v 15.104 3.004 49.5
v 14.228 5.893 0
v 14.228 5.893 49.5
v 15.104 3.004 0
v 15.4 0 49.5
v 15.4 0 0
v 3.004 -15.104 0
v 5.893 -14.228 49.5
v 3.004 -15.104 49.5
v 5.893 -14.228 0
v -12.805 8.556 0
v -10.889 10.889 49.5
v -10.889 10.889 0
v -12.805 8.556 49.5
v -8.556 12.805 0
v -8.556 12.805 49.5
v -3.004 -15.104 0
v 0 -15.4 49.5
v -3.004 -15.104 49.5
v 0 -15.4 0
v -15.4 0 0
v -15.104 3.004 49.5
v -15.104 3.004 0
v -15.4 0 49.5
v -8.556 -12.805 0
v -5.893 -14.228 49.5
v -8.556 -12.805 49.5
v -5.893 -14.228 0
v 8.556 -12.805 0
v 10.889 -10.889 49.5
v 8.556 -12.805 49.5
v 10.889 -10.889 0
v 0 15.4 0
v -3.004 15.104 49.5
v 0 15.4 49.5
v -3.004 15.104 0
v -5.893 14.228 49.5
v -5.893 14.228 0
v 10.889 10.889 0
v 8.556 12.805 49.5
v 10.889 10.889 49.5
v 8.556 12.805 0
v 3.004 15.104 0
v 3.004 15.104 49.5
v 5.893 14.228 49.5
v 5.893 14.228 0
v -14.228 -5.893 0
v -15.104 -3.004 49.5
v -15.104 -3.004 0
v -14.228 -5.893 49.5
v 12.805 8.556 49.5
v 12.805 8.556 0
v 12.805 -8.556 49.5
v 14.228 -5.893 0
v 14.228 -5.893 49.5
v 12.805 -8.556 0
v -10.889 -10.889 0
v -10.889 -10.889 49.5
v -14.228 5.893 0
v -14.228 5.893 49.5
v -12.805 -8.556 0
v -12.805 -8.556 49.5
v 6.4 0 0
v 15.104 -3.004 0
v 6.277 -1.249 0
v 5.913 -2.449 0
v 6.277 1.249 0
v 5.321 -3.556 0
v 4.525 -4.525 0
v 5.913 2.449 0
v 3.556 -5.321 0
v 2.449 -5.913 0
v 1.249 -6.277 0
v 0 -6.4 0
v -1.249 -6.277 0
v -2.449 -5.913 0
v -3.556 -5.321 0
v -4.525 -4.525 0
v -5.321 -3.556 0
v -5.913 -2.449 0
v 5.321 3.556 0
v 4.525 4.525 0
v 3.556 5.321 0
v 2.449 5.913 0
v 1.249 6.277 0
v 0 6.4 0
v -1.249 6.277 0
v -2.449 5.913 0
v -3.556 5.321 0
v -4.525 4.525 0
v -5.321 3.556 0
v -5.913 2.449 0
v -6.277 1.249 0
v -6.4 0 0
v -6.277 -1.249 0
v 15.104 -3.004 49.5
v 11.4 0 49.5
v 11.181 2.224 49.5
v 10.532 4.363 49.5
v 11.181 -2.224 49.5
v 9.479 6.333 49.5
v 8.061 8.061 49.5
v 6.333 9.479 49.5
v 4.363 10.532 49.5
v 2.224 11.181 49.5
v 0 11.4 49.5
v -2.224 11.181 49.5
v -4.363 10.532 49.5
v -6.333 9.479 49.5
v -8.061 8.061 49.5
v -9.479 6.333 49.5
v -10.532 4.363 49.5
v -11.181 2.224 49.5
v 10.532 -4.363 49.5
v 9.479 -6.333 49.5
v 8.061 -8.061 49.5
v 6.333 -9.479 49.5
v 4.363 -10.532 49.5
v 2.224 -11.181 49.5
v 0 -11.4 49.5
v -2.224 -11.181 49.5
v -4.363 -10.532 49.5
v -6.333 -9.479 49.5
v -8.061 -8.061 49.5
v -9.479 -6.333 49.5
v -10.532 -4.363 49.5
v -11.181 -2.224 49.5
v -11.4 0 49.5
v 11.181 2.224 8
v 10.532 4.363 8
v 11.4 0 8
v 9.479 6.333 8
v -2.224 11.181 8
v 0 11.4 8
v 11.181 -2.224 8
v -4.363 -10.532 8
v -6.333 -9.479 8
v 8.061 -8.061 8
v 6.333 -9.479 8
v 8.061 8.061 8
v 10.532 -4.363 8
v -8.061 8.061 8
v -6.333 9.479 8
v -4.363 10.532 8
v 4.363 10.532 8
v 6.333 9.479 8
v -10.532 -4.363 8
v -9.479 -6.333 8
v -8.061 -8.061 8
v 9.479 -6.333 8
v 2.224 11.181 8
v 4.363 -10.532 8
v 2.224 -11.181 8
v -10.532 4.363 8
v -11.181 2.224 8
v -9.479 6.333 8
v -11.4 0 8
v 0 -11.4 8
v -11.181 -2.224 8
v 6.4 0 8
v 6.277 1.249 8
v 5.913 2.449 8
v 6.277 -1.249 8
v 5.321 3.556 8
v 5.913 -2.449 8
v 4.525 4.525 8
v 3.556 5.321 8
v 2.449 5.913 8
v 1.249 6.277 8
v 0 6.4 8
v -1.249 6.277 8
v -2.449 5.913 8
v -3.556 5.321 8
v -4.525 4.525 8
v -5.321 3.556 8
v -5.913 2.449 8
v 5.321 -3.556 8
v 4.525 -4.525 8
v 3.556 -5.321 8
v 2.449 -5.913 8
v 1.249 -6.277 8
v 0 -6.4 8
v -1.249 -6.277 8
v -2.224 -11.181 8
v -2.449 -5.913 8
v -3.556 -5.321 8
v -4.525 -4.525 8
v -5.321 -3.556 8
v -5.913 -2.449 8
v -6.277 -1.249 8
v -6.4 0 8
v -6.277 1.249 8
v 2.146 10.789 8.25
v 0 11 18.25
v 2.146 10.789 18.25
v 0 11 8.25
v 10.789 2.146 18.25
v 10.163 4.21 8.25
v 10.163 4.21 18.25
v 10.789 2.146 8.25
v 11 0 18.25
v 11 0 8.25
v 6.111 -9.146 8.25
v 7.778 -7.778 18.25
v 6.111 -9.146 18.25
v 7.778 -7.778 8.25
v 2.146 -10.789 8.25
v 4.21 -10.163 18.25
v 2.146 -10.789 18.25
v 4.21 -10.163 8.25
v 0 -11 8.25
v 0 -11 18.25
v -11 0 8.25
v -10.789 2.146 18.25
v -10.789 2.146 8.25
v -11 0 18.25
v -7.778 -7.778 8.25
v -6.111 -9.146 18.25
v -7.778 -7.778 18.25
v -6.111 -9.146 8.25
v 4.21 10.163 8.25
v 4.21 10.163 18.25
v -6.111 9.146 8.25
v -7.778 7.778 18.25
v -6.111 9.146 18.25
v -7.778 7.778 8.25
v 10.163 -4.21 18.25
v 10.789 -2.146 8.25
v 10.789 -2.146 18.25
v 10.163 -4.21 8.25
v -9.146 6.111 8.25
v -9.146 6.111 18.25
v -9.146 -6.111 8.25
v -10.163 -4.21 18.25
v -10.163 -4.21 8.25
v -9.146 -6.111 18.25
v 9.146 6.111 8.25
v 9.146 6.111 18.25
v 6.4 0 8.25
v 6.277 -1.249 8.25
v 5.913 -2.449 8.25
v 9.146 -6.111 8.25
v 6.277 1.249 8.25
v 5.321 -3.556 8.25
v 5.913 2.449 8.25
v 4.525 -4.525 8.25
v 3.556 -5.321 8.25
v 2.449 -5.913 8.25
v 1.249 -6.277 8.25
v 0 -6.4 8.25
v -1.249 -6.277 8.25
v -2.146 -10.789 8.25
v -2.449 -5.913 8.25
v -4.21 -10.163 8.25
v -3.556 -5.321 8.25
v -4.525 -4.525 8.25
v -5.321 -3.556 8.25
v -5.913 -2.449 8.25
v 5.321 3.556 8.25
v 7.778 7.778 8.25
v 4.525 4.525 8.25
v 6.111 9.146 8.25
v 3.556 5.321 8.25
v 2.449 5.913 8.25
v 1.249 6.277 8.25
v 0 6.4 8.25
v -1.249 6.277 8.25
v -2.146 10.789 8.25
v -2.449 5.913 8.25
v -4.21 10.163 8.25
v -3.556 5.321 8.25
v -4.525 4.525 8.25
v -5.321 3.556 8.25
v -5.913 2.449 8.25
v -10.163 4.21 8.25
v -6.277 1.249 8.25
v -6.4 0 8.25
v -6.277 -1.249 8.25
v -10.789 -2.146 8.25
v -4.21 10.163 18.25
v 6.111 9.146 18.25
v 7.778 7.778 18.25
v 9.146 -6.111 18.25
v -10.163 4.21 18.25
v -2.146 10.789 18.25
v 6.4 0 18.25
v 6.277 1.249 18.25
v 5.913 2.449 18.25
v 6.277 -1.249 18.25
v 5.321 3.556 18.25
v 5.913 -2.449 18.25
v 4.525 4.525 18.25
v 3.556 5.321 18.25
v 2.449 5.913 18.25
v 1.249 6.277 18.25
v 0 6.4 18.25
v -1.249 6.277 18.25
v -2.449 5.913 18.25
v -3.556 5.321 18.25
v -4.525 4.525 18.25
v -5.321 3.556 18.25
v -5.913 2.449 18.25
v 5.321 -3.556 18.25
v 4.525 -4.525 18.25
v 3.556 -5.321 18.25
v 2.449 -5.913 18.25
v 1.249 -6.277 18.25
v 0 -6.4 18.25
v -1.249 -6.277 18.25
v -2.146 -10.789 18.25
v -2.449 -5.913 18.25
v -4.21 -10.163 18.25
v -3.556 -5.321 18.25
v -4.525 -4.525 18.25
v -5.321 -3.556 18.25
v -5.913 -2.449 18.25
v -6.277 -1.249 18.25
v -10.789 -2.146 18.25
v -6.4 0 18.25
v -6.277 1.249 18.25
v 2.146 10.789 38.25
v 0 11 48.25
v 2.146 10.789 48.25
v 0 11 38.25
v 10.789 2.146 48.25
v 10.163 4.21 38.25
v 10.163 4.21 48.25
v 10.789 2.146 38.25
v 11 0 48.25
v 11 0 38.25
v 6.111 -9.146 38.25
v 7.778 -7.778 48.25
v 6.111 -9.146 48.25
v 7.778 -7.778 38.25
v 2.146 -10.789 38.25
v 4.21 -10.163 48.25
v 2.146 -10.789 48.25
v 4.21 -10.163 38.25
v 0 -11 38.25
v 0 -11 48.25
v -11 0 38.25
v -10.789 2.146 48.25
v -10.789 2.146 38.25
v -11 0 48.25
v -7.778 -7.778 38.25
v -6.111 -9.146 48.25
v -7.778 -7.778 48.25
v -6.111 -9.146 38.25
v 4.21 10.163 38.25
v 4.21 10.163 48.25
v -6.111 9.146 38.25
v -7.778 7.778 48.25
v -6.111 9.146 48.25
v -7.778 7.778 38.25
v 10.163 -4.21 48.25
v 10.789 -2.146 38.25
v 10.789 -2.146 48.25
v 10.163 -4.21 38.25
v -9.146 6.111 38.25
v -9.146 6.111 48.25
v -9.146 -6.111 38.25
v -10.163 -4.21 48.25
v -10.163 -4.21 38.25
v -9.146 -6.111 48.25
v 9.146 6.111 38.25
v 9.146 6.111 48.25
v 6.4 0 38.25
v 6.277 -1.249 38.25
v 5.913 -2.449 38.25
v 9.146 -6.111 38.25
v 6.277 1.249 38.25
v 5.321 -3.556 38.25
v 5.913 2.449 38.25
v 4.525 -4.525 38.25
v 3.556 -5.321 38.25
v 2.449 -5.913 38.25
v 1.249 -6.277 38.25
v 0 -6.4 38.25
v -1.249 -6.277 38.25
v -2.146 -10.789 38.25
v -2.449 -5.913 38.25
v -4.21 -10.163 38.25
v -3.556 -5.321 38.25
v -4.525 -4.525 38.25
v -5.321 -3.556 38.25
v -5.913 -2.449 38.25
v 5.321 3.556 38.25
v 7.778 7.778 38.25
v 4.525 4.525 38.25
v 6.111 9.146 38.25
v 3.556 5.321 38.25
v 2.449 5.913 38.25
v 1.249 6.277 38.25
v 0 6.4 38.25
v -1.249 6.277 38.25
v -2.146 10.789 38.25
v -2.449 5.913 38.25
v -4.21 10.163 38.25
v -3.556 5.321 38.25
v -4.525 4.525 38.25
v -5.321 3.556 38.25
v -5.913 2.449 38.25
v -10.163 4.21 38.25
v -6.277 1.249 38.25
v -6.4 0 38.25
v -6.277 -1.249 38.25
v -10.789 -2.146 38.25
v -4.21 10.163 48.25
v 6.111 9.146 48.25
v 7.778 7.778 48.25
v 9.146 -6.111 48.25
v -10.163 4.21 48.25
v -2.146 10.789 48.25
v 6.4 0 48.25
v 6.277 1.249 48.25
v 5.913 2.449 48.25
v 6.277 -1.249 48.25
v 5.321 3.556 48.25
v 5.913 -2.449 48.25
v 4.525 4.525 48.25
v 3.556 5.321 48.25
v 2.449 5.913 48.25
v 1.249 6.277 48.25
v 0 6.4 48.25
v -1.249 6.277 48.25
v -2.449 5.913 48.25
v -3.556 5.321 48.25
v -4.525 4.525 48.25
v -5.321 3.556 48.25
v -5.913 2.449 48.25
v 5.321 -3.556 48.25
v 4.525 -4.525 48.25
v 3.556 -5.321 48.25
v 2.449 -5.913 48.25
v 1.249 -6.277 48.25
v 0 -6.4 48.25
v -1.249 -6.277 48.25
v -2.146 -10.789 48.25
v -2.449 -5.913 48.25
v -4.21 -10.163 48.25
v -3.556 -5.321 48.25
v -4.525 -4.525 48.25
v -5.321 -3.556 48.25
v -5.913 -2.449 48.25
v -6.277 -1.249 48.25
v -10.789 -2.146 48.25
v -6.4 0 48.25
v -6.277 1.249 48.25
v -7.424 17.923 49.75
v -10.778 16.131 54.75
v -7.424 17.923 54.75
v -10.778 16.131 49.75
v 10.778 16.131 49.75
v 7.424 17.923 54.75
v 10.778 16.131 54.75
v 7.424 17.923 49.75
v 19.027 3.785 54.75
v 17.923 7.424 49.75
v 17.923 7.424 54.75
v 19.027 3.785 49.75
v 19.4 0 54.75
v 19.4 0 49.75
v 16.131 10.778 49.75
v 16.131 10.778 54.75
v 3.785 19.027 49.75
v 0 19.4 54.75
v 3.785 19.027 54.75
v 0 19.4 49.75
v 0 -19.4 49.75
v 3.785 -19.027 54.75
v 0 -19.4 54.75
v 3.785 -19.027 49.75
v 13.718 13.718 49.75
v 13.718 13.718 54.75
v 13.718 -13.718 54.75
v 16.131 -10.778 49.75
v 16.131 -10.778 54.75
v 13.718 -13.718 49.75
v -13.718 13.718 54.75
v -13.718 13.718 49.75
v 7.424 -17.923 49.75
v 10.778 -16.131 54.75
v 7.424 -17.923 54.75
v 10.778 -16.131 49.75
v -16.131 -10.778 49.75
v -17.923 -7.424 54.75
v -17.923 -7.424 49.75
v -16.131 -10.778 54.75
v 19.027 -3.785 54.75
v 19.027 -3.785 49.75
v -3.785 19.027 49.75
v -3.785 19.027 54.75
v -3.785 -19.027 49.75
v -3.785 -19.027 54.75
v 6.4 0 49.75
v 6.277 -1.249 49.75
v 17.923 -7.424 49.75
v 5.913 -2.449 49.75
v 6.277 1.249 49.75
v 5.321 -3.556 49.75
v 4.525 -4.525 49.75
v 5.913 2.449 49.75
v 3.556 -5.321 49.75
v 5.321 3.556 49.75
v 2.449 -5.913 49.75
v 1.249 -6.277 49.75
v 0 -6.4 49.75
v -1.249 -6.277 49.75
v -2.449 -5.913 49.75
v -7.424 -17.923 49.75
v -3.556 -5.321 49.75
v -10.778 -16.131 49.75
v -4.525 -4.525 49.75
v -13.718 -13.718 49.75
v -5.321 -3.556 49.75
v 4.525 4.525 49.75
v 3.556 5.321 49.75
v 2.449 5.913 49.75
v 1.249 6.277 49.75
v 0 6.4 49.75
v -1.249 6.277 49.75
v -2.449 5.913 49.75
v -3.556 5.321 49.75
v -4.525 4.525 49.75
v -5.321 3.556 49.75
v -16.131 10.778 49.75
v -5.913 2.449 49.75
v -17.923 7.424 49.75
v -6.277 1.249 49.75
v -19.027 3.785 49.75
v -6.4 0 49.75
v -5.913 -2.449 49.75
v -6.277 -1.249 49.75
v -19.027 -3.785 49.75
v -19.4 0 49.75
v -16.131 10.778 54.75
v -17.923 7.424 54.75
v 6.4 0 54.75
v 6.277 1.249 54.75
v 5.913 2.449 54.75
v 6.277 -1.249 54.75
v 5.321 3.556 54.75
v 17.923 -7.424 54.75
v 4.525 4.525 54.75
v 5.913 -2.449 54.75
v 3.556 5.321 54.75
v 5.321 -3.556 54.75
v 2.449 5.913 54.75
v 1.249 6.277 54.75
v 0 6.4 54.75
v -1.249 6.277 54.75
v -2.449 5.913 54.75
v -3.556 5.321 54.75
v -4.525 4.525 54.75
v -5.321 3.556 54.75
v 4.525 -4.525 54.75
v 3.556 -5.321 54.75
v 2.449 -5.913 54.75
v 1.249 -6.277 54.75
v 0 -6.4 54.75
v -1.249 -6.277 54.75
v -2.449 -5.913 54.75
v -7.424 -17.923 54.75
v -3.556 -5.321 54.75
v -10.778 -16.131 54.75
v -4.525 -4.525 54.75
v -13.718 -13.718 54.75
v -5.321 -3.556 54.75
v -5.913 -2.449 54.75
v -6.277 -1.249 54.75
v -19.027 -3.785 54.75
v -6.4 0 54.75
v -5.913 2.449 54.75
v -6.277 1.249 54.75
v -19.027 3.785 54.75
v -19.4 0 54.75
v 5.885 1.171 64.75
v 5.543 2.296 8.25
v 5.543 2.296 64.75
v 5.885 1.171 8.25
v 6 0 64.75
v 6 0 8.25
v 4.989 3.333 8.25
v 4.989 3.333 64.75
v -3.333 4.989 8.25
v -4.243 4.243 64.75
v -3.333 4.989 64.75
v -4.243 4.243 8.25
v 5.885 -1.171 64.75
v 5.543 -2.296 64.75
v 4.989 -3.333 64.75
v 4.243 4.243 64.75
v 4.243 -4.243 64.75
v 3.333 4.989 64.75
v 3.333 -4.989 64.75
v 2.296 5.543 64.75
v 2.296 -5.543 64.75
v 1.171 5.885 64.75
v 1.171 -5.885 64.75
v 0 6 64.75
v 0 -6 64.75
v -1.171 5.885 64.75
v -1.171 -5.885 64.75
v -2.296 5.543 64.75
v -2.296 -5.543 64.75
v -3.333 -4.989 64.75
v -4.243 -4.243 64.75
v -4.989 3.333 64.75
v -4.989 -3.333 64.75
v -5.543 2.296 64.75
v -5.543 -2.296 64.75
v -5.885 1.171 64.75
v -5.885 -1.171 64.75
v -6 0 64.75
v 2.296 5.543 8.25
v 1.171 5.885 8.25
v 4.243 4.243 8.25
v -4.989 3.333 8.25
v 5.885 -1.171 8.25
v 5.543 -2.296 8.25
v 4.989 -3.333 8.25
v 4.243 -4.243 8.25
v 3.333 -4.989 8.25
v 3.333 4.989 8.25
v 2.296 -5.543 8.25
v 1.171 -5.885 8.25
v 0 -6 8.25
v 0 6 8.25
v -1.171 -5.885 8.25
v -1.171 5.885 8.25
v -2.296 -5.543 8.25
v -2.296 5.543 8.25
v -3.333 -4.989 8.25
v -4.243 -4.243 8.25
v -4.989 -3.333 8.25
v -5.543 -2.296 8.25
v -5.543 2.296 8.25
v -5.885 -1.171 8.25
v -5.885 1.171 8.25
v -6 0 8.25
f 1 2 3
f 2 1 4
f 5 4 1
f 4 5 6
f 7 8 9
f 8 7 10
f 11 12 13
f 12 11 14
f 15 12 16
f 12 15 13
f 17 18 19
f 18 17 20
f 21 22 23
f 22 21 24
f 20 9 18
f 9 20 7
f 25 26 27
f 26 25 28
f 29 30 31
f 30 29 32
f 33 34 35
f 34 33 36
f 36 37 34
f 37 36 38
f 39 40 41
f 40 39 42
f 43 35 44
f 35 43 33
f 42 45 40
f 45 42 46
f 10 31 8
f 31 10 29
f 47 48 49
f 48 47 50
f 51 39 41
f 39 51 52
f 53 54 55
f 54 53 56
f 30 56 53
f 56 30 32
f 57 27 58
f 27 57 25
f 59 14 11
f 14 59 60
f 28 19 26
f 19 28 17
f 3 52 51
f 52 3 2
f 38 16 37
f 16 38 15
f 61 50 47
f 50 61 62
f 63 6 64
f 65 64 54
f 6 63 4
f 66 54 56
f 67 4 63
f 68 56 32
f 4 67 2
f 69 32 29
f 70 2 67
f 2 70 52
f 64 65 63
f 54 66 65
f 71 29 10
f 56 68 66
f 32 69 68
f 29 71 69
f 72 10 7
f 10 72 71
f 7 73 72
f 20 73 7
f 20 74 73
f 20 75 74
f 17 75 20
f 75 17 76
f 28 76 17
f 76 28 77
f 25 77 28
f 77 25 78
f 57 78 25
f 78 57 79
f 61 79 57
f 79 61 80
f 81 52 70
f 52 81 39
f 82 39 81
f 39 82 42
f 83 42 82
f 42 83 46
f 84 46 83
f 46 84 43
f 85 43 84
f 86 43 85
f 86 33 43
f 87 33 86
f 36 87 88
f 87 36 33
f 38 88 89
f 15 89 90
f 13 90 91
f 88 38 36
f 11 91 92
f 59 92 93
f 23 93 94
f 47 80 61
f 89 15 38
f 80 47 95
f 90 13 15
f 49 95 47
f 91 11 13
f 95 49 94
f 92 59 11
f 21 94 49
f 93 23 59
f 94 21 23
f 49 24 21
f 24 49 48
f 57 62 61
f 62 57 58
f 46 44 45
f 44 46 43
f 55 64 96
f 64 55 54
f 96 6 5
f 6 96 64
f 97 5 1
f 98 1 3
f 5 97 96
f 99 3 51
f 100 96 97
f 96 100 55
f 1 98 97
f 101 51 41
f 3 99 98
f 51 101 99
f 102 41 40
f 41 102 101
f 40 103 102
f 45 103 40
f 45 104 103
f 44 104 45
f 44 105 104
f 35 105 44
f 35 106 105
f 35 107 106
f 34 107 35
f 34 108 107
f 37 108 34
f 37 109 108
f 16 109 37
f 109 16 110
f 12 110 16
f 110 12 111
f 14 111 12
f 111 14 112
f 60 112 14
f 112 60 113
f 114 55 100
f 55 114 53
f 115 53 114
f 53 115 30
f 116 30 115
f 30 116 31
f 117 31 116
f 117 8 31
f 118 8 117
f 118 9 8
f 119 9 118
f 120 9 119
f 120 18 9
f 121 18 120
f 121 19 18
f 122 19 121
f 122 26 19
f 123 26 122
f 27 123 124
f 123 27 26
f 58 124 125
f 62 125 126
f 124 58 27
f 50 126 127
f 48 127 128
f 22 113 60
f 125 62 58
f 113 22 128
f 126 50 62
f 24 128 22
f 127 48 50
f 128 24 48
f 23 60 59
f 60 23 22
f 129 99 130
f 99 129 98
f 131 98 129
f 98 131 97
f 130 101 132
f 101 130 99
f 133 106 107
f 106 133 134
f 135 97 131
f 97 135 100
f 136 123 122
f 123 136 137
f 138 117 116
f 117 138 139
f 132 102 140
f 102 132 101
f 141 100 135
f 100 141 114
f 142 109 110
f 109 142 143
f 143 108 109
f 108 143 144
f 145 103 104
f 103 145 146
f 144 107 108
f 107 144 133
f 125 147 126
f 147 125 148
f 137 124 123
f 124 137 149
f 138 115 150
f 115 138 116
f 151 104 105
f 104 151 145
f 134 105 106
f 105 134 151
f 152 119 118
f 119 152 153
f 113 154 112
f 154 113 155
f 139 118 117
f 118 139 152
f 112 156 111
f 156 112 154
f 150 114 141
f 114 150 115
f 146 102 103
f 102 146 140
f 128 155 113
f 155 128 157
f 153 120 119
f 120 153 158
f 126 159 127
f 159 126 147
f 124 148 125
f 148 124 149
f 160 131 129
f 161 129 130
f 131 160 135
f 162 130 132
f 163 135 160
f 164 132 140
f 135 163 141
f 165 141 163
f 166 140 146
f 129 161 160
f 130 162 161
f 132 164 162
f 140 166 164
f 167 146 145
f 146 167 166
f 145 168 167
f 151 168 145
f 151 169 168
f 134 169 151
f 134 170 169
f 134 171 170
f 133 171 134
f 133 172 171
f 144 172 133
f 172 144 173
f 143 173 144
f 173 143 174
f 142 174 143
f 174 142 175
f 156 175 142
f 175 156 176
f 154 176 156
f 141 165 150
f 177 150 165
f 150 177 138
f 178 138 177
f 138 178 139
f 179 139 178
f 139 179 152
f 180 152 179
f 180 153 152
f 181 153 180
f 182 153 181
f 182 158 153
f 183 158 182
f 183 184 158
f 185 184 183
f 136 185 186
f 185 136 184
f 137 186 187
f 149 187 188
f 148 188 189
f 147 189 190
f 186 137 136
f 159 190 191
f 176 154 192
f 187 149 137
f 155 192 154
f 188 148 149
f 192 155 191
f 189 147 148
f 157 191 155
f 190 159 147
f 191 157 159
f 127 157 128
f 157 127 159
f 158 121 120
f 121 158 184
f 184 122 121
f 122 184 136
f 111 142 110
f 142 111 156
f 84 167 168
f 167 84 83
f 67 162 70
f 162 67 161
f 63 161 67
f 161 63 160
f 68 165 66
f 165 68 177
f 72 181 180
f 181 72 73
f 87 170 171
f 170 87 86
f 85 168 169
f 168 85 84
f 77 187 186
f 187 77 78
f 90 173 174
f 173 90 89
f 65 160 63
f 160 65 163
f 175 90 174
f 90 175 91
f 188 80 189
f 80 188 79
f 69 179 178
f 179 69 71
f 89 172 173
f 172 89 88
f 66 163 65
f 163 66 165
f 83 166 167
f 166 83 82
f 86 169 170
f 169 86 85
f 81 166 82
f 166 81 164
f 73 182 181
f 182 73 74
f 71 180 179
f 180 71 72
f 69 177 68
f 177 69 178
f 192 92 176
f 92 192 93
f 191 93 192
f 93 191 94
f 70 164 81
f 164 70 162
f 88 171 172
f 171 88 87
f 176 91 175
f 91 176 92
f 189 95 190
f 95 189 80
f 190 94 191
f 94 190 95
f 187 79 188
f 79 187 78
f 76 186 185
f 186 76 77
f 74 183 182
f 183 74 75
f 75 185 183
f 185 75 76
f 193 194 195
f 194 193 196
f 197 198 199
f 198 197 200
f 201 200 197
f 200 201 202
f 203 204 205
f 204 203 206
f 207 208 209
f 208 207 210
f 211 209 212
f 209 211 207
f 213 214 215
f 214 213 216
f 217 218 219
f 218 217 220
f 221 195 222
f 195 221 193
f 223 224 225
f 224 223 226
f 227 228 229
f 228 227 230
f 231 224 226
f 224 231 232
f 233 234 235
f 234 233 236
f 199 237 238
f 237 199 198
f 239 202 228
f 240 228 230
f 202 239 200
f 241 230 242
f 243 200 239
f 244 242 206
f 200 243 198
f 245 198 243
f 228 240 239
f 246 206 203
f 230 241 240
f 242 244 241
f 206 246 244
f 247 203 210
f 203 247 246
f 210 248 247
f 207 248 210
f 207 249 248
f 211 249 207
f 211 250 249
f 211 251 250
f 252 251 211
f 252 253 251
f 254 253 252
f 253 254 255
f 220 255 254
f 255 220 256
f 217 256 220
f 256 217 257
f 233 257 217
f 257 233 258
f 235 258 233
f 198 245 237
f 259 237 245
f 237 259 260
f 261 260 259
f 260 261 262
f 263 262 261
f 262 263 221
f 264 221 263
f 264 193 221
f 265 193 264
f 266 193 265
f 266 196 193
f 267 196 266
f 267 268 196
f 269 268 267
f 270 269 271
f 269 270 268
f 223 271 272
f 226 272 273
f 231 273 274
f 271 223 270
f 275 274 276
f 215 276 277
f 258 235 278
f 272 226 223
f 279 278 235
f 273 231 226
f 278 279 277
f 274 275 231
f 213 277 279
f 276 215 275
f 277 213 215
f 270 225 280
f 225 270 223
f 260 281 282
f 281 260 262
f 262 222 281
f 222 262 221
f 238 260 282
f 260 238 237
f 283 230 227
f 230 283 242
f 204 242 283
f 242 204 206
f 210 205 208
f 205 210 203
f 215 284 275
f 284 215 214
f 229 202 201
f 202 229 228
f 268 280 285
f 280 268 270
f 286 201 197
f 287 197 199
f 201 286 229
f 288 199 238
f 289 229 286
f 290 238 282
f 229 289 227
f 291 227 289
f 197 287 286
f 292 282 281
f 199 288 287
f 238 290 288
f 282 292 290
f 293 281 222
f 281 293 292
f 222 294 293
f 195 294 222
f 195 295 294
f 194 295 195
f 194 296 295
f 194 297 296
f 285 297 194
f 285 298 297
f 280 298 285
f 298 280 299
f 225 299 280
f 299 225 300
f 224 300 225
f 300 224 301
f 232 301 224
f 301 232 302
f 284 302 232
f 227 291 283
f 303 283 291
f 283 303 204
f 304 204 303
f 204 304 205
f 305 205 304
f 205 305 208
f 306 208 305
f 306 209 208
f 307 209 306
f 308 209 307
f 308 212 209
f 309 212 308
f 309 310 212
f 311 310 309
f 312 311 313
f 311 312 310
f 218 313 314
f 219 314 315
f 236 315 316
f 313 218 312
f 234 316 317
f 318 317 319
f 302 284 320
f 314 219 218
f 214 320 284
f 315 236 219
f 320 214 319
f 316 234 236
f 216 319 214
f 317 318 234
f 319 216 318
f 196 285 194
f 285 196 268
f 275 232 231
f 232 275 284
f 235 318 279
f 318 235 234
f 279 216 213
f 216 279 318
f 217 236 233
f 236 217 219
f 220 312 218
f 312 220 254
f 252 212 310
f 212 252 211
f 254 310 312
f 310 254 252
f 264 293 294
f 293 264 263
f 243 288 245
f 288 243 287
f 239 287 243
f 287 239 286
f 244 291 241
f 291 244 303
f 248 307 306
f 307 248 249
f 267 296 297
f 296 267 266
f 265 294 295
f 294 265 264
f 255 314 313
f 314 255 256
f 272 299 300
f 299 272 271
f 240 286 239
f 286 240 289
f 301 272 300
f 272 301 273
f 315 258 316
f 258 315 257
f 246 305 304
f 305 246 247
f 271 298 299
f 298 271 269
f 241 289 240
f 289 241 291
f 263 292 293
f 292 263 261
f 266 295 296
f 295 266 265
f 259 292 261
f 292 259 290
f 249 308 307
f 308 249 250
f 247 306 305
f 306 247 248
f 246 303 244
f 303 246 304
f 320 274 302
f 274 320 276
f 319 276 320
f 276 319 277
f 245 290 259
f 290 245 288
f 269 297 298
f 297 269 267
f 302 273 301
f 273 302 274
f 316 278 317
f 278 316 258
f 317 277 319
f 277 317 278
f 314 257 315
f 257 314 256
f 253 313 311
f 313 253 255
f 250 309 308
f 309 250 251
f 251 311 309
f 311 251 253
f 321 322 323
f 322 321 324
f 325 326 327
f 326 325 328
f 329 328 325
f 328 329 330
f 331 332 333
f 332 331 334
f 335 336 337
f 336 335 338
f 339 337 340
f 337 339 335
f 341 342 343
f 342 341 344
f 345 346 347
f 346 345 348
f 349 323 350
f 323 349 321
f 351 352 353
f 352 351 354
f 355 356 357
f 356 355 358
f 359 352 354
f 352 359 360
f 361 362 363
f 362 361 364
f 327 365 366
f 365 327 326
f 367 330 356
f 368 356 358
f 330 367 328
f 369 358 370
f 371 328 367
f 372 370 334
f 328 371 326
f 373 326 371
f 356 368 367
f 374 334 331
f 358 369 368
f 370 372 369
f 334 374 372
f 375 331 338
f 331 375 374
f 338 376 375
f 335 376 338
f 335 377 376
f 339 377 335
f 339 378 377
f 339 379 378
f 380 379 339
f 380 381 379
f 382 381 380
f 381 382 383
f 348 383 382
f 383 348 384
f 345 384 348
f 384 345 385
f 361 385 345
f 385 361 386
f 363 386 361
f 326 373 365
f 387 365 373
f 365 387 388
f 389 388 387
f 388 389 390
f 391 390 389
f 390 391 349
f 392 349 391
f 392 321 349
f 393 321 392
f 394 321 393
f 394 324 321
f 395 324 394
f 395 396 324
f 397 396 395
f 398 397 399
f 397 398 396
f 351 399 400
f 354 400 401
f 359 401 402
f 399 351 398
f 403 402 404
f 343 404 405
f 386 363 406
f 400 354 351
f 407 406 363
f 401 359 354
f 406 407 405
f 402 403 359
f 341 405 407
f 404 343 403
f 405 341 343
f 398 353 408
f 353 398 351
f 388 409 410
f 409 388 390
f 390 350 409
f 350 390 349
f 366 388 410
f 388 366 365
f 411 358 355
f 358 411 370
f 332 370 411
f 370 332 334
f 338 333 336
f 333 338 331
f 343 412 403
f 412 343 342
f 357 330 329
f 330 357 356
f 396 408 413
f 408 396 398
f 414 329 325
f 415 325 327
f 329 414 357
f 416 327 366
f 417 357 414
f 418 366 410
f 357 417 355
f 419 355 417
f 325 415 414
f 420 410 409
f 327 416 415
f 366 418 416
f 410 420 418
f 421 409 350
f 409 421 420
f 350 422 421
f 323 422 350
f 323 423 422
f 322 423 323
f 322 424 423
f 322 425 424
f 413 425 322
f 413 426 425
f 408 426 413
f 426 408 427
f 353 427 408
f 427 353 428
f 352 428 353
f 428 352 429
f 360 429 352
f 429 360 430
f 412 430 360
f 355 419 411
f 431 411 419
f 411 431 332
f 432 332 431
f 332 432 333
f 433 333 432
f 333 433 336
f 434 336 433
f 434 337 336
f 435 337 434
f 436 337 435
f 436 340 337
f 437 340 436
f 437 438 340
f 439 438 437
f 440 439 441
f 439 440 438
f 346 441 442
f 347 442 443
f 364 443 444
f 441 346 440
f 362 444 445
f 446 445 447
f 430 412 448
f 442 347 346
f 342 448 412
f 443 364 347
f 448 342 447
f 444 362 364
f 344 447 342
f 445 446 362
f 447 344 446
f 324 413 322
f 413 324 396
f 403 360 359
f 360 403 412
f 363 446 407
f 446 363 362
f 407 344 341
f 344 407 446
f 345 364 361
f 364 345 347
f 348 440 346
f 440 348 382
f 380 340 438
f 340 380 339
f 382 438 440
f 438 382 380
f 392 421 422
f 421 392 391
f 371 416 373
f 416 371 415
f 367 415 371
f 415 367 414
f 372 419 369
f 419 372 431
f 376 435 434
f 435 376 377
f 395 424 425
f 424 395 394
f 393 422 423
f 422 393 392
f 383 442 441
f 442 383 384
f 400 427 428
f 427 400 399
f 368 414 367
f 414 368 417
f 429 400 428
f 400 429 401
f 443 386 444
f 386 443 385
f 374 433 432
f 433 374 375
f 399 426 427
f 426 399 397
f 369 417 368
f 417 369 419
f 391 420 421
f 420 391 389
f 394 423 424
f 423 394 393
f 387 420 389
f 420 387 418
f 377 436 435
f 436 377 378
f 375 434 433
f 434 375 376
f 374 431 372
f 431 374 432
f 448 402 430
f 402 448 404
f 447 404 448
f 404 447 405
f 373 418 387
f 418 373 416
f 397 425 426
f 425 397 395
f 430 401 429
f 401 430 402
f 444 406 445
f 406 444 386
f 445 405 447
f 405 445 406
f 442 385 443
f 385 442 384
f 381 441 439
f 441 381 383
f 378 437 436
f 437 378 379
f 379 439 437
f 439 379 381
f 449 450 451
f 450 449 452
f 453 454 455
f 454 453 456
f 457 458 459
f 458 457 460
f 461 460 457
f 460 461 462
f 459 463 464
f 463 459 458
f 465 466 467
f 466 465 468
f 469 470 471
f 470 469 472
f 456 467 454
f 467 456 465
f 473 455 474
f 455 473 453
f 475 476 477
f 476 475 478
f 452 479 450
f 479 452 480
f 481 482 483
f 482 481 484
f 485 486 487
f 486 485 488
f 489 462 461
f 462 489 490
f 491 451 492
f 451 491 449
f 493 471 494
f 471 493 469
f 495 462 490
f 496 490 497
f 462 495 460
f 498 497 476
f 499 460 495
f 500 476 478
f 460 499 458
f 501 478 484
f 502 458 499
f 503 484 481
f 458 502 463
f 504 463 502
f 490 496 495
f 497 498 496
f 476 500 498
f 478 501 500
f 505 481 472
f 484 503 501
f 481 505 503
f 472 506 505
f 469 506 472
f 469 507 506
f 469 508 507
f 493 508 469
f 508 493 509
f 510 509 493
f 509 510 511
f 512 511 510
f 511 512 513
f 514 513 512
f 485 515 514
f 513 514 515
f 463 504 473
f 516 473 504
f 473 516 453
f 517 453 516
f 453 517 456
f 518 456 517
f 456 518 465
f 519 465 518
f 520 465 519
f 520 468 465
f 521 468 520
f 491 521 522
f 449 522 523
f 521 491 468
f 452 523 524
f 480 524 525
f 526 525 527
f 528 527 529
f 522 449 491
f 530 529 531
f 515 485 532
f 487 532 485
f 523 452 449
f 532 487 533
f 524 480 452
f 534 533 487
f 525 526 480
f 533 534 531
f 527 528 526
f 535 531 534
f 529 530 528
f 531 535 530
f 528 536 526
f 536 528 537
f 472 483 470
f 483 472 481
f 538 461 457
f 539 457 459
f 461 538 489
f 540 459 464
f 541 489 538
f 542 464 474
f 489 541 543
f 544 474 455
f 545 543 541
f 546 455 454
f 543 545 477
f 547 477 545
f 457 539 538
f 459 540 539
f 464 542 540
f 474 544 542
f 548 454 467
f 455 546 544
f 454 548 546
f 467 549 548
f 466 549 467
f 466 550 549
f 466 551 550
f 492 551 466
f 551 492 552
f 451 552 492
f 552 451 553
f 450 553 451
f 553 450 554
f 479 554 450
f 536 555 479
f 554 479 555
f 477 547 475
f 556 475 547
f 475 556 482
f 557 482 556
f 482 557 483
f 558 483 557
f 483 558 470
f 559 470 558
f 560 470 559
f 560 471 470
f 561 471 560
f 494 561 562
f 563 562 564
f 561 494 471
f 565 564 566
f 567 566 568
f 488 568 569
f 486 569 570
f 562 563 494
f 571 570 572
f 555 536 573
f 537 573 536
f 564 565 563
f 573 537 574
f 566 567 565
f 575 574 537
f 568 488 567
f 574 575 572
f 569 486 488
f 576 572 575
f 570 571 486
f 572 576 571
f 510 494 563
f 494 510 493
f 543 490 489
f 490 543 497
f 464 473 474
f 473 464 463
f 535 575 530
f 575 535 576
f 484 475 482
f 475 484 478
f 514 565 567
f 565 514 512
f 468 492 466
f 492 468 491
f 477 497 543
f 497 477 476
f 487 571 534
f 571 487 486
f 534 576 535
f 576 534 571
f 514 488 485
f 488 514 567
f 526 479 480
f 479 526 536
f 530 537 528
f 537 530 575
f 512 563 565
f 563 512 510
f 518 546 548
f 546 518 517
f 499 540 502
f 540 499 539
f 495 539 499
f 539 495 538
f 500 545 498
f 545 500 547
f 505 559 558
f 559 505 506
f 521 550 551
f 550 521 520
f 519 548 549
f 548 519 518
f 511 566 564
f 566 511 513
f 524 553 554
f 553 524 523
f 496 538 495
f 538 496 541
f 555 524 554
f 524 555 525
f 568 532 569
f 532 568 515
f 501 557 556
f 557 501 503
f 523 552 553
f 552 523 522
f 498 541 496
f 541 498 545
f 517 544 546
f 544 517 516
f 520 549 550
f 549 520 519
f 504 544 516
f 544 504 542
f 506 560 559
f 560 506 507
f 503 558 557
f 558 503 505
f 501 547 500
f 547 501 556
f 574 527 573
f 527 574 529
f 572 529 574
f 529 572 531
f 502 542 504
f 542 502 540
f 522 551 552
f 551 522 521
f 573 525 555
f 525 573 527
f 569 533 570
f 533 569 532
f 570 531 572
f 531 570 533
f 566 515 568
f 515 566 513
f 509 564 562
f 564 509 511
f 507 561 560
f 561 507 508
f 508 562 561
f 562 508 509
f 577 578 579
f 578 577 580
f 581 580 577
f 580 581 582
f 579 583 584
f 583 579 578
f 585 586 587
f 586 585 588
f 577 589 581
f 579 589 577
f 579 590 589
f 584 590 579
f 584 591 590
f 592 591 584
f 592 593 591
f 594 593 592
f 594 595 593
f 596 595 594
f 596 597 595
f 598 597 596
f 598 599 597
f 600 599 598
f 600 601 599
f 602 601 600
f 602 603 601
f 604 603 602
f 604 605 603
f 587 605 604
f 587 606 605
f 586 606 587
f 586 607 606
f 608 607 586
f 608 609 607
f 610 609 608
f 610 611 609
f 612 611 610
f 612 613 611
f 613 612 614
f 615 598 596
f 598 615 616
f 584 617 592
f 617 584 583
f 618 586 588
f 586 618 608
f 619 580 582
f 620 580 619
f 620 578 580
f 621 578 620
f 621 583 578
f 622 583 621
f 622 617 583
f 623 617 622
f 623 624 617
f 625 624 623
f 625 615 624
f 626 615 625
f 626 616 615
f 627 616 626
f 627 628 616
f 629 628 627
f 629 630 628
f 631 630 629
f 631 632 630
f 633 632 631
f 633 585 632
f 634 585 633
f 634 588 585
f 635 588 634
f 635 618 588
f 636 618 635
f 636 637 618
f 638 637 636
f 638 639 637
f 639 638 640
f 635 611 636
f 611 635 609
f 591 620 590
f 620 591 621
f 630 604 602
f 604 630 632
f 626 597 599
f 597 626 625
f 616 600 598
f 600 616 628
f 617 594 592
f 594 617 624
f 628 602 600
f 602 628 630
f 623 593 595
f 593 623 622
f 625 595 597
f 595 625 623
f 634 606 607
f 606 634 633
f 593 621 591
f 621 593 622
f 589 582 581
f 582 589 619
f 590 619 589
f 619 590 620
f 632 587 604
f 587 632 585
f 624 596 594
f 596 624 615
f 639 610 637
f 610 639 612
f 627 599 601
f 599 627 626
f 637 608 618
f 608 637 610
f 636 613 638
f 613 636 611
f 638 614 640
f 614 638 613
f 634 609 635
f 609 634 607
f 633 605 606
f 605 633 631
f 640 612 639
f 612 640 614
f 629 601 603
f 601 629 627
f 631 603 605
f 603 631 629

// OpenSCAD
$fn = 32;

// ------------------------------------------------------------------------
// Shaft station: cup d30.8 x 49.5 mm, shaft d12
// Every part is its own module, assembly() places every instance.
// ------------------------------------------------------------------------

// --- part 1 ---
module housing_cup() {
  difference() {
    cylinder(h = 49.5, d = 30.8);
    translate([0, 0, 8]) cylinder(h = 42.5, d = 22.8);
    translate([0, 0, -1]) cylinder(h = 10, d = 12.8);
  }
}

// --- part 2 ---
module bearing_lower() {
  difference() {
      translate([0, 0, 0]) cylinder(h = 10, d = 22);
      translate([0, 0, -1]) cylinder(h = 12, d = 12.8);
    }
}

// --- part 3 ---
module bearing_upper() {
  difference() {
      translate([0, 0, 0]) cylinder(h = 10, d = 22);
      translate([0, 0, -1]) cylinder(h = 12, d = 12.8);
    }
}

// --- part 4 ---
module station_shaft() {
  translate([0, 0, -28.25]) cylinder(h = 56.5, d = 12);
}

// --- part 5 ---
module station_cover() {
  difference() {
    cylinder(h = 5, d = 38.8);
    translate([0, 0, -1]) cylinder(h = 7, d = 12.8);
  }
}

// --- assembly ---
module assembly() {
  color([0.80, 0.24, 0.20]) translate([0, 0, 0]) rotate([0, 0, 0]) housing_cup();
  color([0.20, 0.45, 0.75]) translate([0, 0, 8.25]) rotate([0, 0, 0]) bearing_lower();
  color([0.25, 0.62, 0.32]) translate([0, 0, 38.25]) rotate([0, 0, 0]) bearing_upper();
  color([0.92, 0.70, 0.18]) translate([0, 0, 36.5]) rotate([0, 0, 0]) station_shaft();
  color([0.58, 0.35, 0.70]) translate([0, 0, 49.75]) rotate([0, 0, 0]) station_cover();
}

assembly();
